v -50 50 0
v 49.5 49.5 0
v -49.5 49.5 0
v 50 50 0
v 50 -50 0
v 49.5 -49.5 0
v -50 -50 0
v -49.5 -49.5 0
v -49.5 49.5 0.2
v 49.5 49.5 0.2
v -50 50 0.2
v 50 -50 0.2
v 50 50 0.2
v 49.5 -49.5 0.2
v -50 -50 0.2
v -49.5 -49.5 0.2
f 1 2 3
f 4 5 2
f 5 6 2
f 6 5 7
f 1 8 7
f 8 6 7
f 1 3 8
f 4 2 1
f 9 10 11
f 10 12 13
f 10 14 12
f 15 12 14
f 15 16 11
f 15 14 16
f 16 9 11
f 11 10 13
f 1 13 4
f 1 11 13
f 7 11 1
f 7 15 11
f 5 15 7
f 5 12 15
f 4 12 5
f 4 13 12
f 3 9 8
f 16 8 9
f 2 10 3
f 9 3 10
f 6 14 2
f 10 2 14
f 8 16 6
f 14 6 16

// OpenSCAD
// How wide should the frame be on X-axis?
x_width = 100;
// How wide should the frame be on Y-axis?
y_width = 100;
// How wide should the frame be?
frame_width = 1;
// How high should the frame be?
frame_height = 0.2;

linear_extrude(frame_height)
difference() {
    square([x_width, y_width], center=true);
    square([x_width - frame_width, y_width - frame_width], center=true);
}
